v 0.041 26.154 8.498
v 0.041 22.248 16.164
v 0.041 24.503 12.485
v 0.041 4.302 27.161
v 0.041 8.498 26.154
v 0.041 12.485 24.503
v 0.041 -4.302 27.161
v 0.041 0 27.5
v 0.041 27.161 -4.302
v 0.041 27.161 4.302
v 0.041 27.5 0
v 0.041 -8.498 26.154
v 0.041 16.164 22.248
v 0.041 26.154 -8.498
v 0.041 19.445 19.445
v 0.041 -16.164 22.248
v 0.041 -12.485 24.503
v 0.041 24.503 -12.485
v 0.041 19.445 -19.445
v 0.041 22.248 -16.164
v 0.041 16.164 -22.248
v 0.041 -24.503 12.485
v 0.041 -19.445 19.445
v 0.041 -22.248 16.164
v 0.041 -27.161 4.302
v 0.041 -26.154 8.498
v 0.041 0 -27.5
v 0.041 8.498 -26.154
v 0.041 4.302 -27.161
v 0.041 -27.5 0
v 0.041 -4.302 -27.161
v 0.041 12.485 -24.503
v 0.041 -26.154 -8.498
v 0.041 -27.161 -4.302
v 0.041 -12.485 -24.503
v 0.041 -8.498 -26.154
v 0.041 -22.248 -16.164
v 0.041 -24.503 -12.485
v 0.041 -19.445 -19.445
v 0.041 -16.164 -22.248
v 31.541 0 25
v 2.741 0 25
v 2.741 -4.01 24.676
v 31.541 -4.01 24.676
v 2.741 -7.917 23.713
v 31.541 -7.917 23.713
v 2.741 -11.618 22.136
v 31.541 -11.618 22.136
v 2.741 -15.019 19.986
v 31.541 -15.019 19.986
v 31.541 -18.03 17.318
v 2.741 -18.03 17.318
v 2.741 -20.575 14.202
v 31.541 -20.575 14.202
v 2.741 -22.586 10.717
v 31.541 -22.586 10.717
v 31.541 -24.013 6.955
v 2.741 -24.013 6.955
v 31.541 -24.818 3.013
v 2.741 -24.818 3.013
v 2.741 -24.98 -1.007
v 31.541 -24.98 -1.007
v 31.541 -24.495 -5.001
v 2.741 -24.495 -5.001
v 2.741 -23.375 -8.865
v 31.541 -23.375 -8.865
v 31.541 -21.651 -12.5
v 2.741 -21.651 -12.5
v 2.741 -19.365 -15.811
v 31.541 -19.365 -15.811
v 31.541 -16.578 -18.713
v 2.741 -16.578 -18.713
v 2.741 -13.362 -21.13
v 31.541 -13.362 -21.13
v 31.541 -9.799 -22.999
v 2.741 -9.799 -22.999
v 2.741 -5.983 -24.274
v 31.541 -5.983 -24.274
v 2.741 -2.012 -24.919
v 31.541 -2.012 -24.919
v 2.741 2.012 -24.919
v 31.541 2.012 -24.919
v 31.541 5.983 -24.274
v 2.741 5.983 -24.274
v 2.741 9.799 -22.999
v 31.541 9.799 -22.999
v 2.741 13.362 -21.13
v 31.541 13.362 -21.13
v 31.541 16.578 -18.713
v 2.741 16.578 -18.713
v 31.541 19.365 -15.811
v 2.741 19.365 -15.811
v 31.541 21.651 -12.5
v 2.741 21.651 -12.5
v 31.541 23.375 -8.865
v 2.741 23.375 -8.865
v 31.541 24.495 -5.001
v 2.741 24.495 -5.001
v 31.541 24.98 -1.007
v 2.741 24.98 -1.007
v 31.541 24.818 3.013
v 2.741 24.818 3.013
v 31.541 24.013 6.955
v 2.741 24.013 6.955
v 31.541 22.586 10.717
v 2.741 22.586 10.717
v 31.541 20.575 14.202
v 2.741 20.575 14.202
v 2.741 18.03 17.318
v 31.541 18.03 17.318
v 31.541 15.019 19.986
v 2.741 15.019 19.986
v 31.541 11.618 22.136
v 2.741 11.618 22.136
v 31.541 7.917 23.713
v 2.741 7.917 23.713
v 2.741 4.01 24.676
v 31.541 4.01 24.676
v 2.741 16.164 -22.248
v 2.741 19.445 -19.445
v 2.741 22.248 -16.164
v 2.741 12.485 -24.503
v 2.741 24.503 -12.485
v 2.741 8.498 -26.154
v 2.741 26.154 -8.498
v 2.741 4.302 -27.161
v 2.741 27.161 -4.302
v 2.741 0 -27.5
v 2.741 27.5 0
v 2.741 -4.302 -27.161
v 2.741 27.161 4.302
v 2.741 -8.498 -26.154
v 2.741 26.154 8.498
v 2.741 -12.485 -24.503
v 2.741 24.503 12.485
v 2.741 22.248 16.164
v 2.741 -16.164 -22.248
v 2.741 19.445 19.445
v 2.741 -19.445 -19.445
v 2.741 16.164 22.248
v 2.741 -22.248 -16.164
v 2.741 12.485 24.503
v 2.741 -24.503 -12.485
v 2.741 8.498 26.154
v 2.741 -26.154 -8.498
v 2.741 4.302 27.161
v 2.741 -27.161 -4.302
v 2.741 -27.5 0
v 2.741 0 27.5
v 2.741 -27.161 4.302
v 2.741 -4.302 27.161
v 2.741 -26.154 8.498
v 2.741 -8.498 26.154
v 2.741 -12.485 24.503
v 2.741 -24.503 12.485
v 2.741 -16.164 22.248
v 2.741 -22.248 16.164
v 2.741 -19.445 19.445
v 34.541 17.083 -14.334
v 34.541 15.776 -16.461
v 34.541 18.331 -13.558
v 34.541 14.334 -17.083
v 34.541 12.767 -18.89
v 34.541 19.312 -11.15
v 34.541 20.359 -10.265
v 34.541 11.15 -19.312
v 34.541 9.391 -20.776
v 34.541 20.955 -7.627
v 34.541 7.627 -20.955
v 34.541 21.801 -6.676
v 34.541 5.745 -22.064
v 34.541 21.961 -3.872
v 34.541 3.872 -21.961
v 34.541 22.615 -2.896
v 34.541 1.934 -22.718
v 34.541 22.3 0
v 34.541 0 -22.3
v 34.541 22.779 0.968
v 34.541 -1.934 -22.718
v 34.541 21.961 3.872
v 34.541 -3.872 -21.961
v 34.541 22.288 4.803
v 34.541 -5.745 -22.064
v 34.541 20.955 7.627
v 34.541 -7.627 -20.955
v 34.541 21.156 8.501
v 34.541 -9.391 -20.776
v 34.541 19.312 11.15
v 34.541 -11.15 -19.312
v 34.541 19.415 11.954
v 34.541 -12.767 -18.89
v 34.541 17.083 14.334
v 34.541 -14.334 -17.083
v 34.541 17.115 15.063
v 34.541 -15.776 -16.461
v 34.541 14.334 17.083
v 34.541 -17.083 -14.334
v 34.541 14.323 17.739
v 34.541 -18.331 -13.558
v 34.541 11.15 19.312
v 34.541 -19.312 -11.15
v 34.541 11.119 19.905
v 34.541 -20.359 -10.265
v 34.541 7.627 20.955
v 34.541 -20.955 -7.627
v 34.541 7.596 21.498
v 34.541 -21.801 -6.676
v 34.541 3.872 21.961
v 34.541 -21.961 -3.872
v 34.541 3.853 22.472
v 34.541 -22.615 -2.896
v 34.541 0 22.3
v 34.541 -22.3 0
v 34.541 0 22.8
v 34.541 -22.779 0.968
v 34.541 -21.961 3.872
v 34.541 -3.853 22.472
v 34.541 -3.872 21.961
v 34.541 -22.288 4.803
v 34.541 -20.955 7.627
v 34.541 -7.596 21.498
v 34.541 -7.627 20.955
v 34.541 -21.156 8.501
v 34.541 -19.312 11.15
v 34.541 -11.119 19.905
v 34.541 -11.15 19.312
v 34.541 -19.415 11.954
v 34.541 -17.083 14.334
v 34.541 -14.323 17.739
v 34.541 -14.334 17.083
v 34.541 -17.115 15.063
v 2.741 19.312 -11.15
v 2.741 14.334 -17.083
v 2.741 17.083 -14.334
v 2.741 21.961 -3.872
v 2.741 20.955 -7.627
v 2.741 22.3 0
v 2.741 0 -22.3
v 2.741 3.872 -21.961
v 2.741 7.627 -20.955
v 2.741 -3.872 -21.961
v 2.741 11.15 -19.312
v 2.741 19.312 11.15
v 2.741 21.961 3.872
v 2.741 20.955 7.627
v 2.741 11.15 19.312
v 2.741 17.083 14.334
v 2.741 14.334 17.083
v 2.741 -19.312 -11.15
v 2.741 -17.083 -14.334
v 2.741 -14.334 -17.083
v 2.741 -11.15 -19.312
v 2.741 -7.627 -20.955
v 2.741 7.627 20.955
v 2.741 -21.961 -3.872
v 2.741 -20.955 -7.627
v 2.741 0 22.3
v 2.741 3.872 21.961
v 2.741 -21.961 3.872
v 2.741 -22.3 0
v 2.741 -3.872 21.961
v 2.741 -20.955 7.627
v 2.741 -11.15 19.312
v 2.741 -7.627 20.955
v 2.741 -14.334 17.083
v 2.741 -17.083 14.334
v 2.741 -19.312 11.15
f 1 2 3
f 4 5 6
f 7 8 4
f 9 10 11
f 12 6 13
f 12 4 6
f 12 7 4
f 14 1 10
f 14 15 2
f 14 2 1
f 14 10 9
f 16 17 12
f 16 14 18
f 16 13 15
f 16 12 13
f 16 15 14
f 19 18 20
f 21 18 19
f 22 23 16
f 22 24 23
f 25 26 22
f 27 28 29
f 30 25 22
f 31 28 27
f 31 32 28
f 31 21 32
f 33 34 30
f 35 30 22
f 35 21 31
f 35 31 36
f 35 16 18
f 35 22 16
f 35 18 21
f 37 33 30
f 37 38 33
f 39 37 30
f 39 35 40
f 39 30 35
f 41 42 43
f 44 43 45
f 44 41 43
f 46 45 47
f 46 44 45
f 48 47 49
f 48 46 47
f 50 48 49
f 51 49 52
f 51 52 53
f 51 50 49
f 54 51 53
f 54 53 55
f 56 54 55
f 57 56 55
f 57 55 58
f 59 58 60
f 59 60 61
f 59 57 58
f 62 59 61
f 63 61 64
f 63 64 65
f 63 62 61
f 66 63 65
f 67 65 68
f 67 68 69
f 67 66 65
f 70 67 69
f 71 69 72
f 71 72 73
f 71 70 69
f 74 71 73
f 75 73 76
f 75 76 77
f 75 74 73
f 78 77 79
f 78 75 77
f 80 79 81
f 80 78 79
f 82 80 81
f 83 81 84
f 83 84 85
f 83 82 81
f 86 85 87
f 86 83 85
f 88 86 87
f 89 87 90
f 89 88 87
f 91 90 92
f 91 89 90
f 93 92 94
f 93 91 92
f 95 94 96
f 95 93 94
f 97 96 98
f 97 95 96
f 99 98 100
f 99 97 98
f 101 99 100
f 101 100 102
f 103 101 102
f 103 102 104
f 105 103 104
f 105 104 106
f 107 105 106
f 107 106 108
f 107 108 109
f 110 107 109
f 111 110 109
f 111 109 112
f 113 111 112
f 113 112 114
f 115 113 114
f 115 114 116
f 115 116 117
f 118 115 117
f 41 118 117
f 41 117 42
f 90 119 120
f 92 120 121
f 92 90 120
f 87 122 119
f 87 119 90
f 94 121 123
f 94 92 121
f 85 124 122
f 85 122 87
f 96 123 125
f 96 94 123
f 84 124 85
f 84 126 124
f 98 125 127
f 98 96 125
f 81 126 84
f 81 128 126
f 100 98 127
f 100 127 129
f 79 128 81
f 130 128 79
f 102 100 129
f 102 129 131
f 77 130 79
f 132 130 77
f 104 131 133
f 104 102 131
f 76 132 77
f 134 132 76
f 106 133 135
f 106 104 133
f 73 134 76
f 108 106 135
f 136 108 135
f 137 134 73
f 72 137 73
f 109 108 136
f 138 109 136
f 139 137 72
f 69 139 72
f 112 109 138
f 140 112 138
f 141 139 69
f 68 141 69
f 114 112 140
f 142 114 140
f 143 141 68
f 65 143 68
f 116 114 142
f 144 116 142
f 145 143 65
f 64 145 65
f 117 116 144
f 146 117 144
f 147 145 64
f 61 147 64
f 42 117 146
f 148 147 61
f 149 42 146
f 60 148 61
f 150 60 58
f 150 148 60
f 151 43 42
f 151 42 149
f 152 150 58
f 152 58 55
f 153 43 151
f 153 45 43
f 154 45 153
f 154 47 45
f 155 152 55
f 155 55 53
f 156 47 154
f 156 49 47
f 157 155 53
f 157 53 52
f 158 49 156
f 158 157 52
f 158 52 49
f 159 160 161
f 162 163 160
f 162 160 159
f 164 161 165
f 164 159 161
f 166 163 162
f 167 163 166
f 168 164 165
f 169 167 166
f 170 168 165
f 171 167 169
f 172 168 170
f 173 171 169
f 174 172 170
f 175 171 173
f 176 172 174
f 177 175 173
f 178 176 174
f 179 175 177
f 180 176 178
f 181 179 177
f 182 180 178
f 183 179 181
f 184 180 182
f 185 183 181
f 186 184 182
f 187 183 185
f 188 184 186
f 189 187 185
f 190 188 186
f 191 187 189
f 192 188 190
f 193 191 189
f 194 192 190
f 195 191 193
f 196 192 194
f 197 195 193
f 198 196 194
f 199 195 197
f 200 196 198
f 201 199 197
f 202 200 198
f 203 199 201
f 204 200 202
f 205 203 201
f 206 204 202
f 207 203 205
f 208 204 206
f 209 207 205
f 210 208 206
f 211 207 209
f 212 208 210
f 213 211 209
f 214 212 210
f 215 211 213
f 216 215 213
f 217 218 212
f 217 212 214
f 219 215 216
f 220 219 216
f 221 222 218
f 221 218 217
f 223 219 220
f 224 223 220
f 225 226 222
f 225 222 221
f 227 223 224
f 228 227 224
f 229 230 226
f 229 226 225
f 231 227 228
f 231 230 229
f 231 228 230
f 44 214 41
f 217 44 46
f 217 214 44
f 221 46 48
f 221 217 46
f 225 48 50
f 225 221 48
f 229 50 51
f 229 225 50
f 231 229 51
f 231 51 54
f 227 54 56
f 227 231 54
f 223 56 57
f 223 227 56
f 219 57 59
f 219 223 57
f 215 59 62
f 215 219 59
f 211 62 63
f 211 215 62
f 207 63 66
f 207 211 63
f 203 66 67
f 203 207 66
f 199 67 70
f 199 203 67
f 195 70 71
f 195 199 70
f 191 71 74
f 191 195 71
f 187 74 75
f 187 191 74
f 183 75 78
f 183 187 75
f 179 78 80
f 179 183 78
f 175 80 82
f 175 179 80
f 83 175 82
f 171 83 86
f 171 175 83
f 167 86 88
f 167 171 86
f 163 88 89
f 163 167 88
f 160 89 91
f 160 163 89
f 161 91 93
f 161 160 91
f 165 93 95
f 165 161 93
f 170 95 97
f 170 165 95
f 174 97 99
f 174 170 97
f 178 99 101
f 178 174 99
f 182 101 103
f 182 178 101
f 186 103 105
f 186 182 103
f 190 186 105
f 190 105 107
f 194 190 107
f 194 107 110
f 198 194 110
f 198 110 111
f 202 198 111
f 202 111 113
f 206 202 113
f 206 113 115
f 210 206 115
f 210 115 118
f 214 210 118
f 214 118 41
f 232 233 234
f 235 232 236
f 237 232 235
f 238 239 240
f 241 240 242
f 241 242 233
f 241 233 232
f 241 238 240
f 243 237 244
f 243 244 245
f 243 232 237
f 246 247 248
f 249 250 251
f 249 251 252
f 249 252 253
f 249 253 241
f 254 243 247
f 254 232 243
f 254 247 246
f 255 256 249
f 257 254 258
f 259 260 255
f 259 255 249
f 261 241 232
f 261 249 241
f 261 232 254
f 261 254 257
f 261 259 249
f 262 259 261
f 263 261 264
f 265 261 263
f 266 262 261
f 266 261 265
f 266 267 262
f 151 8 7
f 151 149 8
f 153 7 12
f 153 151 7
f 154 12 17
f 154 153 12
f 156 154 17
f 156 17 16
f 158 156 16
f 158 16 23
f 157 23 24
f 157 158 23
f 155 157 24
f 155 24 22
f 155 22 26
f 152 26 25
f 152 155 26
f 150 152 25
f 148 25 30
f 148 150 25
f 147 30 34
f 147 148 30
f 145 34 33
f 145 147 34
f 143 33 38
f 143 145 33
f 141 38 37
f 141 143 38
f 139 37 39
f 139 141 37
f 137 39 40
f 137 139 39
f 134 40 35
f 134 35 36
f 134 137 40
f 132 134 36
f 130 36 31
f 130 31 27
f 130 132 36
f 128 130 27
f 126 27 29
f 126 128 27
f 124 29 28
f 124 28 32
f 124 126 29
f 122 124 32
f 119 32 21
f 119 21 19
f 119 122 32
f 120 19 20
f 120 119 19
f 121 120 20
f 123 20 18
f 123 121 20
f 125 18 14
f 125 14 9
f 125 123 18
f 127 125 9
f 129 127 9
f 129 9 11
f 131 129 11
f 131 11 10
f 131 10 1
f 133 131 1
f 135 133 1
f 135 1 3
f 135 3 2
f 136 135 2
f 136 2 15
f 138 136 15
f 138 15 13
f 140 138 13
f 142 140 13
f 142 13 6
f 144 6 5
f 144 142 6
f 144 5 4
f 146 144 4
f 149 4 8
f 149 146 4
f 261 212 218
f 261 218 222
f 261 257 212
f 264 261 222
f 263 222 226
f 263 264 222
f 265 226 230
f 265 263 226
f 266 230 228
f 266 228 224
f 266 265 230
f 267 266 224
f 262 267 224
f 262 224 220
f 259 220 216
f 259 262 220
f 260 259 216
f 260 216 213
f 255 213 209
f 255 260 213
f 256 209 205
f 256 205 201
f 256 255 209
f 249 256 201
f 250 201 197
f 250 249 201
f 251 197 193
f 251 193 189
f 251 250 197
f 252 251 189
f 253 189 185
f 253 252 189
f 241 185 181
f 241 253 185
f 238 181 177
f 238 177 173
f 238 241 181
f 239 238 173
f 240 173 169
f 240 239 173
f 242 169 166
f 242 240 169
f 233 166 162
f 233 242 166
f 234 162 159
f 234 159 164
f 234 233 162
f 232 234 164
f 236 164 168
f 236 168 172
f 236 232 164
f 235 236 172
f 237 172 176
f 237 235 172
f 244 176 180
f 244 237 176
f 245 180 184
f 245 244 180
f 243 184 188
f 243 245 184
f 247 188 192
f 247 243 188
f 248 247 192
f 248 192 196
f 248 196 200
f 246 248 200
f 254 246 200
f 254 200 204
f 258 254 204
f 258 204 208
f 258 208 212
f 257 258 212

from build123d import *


with BuildPart() as part:
    # Sketch → Revolution (revolve)
    with BuildSketch(Plane.XZ):
        Polygon((0.040665, 0), (0.040665, 27.5), (2.740665, 27.5), (2.740665, 25), (31.540664, 25), (34.540664, 22.8), (34.540664, 22.3), (2.740665, 22.3), (2.740665, 0), align=None)
    revolve(axis=Axis((0, 0, 0), (1, 0, 0)))


solid = part.part
